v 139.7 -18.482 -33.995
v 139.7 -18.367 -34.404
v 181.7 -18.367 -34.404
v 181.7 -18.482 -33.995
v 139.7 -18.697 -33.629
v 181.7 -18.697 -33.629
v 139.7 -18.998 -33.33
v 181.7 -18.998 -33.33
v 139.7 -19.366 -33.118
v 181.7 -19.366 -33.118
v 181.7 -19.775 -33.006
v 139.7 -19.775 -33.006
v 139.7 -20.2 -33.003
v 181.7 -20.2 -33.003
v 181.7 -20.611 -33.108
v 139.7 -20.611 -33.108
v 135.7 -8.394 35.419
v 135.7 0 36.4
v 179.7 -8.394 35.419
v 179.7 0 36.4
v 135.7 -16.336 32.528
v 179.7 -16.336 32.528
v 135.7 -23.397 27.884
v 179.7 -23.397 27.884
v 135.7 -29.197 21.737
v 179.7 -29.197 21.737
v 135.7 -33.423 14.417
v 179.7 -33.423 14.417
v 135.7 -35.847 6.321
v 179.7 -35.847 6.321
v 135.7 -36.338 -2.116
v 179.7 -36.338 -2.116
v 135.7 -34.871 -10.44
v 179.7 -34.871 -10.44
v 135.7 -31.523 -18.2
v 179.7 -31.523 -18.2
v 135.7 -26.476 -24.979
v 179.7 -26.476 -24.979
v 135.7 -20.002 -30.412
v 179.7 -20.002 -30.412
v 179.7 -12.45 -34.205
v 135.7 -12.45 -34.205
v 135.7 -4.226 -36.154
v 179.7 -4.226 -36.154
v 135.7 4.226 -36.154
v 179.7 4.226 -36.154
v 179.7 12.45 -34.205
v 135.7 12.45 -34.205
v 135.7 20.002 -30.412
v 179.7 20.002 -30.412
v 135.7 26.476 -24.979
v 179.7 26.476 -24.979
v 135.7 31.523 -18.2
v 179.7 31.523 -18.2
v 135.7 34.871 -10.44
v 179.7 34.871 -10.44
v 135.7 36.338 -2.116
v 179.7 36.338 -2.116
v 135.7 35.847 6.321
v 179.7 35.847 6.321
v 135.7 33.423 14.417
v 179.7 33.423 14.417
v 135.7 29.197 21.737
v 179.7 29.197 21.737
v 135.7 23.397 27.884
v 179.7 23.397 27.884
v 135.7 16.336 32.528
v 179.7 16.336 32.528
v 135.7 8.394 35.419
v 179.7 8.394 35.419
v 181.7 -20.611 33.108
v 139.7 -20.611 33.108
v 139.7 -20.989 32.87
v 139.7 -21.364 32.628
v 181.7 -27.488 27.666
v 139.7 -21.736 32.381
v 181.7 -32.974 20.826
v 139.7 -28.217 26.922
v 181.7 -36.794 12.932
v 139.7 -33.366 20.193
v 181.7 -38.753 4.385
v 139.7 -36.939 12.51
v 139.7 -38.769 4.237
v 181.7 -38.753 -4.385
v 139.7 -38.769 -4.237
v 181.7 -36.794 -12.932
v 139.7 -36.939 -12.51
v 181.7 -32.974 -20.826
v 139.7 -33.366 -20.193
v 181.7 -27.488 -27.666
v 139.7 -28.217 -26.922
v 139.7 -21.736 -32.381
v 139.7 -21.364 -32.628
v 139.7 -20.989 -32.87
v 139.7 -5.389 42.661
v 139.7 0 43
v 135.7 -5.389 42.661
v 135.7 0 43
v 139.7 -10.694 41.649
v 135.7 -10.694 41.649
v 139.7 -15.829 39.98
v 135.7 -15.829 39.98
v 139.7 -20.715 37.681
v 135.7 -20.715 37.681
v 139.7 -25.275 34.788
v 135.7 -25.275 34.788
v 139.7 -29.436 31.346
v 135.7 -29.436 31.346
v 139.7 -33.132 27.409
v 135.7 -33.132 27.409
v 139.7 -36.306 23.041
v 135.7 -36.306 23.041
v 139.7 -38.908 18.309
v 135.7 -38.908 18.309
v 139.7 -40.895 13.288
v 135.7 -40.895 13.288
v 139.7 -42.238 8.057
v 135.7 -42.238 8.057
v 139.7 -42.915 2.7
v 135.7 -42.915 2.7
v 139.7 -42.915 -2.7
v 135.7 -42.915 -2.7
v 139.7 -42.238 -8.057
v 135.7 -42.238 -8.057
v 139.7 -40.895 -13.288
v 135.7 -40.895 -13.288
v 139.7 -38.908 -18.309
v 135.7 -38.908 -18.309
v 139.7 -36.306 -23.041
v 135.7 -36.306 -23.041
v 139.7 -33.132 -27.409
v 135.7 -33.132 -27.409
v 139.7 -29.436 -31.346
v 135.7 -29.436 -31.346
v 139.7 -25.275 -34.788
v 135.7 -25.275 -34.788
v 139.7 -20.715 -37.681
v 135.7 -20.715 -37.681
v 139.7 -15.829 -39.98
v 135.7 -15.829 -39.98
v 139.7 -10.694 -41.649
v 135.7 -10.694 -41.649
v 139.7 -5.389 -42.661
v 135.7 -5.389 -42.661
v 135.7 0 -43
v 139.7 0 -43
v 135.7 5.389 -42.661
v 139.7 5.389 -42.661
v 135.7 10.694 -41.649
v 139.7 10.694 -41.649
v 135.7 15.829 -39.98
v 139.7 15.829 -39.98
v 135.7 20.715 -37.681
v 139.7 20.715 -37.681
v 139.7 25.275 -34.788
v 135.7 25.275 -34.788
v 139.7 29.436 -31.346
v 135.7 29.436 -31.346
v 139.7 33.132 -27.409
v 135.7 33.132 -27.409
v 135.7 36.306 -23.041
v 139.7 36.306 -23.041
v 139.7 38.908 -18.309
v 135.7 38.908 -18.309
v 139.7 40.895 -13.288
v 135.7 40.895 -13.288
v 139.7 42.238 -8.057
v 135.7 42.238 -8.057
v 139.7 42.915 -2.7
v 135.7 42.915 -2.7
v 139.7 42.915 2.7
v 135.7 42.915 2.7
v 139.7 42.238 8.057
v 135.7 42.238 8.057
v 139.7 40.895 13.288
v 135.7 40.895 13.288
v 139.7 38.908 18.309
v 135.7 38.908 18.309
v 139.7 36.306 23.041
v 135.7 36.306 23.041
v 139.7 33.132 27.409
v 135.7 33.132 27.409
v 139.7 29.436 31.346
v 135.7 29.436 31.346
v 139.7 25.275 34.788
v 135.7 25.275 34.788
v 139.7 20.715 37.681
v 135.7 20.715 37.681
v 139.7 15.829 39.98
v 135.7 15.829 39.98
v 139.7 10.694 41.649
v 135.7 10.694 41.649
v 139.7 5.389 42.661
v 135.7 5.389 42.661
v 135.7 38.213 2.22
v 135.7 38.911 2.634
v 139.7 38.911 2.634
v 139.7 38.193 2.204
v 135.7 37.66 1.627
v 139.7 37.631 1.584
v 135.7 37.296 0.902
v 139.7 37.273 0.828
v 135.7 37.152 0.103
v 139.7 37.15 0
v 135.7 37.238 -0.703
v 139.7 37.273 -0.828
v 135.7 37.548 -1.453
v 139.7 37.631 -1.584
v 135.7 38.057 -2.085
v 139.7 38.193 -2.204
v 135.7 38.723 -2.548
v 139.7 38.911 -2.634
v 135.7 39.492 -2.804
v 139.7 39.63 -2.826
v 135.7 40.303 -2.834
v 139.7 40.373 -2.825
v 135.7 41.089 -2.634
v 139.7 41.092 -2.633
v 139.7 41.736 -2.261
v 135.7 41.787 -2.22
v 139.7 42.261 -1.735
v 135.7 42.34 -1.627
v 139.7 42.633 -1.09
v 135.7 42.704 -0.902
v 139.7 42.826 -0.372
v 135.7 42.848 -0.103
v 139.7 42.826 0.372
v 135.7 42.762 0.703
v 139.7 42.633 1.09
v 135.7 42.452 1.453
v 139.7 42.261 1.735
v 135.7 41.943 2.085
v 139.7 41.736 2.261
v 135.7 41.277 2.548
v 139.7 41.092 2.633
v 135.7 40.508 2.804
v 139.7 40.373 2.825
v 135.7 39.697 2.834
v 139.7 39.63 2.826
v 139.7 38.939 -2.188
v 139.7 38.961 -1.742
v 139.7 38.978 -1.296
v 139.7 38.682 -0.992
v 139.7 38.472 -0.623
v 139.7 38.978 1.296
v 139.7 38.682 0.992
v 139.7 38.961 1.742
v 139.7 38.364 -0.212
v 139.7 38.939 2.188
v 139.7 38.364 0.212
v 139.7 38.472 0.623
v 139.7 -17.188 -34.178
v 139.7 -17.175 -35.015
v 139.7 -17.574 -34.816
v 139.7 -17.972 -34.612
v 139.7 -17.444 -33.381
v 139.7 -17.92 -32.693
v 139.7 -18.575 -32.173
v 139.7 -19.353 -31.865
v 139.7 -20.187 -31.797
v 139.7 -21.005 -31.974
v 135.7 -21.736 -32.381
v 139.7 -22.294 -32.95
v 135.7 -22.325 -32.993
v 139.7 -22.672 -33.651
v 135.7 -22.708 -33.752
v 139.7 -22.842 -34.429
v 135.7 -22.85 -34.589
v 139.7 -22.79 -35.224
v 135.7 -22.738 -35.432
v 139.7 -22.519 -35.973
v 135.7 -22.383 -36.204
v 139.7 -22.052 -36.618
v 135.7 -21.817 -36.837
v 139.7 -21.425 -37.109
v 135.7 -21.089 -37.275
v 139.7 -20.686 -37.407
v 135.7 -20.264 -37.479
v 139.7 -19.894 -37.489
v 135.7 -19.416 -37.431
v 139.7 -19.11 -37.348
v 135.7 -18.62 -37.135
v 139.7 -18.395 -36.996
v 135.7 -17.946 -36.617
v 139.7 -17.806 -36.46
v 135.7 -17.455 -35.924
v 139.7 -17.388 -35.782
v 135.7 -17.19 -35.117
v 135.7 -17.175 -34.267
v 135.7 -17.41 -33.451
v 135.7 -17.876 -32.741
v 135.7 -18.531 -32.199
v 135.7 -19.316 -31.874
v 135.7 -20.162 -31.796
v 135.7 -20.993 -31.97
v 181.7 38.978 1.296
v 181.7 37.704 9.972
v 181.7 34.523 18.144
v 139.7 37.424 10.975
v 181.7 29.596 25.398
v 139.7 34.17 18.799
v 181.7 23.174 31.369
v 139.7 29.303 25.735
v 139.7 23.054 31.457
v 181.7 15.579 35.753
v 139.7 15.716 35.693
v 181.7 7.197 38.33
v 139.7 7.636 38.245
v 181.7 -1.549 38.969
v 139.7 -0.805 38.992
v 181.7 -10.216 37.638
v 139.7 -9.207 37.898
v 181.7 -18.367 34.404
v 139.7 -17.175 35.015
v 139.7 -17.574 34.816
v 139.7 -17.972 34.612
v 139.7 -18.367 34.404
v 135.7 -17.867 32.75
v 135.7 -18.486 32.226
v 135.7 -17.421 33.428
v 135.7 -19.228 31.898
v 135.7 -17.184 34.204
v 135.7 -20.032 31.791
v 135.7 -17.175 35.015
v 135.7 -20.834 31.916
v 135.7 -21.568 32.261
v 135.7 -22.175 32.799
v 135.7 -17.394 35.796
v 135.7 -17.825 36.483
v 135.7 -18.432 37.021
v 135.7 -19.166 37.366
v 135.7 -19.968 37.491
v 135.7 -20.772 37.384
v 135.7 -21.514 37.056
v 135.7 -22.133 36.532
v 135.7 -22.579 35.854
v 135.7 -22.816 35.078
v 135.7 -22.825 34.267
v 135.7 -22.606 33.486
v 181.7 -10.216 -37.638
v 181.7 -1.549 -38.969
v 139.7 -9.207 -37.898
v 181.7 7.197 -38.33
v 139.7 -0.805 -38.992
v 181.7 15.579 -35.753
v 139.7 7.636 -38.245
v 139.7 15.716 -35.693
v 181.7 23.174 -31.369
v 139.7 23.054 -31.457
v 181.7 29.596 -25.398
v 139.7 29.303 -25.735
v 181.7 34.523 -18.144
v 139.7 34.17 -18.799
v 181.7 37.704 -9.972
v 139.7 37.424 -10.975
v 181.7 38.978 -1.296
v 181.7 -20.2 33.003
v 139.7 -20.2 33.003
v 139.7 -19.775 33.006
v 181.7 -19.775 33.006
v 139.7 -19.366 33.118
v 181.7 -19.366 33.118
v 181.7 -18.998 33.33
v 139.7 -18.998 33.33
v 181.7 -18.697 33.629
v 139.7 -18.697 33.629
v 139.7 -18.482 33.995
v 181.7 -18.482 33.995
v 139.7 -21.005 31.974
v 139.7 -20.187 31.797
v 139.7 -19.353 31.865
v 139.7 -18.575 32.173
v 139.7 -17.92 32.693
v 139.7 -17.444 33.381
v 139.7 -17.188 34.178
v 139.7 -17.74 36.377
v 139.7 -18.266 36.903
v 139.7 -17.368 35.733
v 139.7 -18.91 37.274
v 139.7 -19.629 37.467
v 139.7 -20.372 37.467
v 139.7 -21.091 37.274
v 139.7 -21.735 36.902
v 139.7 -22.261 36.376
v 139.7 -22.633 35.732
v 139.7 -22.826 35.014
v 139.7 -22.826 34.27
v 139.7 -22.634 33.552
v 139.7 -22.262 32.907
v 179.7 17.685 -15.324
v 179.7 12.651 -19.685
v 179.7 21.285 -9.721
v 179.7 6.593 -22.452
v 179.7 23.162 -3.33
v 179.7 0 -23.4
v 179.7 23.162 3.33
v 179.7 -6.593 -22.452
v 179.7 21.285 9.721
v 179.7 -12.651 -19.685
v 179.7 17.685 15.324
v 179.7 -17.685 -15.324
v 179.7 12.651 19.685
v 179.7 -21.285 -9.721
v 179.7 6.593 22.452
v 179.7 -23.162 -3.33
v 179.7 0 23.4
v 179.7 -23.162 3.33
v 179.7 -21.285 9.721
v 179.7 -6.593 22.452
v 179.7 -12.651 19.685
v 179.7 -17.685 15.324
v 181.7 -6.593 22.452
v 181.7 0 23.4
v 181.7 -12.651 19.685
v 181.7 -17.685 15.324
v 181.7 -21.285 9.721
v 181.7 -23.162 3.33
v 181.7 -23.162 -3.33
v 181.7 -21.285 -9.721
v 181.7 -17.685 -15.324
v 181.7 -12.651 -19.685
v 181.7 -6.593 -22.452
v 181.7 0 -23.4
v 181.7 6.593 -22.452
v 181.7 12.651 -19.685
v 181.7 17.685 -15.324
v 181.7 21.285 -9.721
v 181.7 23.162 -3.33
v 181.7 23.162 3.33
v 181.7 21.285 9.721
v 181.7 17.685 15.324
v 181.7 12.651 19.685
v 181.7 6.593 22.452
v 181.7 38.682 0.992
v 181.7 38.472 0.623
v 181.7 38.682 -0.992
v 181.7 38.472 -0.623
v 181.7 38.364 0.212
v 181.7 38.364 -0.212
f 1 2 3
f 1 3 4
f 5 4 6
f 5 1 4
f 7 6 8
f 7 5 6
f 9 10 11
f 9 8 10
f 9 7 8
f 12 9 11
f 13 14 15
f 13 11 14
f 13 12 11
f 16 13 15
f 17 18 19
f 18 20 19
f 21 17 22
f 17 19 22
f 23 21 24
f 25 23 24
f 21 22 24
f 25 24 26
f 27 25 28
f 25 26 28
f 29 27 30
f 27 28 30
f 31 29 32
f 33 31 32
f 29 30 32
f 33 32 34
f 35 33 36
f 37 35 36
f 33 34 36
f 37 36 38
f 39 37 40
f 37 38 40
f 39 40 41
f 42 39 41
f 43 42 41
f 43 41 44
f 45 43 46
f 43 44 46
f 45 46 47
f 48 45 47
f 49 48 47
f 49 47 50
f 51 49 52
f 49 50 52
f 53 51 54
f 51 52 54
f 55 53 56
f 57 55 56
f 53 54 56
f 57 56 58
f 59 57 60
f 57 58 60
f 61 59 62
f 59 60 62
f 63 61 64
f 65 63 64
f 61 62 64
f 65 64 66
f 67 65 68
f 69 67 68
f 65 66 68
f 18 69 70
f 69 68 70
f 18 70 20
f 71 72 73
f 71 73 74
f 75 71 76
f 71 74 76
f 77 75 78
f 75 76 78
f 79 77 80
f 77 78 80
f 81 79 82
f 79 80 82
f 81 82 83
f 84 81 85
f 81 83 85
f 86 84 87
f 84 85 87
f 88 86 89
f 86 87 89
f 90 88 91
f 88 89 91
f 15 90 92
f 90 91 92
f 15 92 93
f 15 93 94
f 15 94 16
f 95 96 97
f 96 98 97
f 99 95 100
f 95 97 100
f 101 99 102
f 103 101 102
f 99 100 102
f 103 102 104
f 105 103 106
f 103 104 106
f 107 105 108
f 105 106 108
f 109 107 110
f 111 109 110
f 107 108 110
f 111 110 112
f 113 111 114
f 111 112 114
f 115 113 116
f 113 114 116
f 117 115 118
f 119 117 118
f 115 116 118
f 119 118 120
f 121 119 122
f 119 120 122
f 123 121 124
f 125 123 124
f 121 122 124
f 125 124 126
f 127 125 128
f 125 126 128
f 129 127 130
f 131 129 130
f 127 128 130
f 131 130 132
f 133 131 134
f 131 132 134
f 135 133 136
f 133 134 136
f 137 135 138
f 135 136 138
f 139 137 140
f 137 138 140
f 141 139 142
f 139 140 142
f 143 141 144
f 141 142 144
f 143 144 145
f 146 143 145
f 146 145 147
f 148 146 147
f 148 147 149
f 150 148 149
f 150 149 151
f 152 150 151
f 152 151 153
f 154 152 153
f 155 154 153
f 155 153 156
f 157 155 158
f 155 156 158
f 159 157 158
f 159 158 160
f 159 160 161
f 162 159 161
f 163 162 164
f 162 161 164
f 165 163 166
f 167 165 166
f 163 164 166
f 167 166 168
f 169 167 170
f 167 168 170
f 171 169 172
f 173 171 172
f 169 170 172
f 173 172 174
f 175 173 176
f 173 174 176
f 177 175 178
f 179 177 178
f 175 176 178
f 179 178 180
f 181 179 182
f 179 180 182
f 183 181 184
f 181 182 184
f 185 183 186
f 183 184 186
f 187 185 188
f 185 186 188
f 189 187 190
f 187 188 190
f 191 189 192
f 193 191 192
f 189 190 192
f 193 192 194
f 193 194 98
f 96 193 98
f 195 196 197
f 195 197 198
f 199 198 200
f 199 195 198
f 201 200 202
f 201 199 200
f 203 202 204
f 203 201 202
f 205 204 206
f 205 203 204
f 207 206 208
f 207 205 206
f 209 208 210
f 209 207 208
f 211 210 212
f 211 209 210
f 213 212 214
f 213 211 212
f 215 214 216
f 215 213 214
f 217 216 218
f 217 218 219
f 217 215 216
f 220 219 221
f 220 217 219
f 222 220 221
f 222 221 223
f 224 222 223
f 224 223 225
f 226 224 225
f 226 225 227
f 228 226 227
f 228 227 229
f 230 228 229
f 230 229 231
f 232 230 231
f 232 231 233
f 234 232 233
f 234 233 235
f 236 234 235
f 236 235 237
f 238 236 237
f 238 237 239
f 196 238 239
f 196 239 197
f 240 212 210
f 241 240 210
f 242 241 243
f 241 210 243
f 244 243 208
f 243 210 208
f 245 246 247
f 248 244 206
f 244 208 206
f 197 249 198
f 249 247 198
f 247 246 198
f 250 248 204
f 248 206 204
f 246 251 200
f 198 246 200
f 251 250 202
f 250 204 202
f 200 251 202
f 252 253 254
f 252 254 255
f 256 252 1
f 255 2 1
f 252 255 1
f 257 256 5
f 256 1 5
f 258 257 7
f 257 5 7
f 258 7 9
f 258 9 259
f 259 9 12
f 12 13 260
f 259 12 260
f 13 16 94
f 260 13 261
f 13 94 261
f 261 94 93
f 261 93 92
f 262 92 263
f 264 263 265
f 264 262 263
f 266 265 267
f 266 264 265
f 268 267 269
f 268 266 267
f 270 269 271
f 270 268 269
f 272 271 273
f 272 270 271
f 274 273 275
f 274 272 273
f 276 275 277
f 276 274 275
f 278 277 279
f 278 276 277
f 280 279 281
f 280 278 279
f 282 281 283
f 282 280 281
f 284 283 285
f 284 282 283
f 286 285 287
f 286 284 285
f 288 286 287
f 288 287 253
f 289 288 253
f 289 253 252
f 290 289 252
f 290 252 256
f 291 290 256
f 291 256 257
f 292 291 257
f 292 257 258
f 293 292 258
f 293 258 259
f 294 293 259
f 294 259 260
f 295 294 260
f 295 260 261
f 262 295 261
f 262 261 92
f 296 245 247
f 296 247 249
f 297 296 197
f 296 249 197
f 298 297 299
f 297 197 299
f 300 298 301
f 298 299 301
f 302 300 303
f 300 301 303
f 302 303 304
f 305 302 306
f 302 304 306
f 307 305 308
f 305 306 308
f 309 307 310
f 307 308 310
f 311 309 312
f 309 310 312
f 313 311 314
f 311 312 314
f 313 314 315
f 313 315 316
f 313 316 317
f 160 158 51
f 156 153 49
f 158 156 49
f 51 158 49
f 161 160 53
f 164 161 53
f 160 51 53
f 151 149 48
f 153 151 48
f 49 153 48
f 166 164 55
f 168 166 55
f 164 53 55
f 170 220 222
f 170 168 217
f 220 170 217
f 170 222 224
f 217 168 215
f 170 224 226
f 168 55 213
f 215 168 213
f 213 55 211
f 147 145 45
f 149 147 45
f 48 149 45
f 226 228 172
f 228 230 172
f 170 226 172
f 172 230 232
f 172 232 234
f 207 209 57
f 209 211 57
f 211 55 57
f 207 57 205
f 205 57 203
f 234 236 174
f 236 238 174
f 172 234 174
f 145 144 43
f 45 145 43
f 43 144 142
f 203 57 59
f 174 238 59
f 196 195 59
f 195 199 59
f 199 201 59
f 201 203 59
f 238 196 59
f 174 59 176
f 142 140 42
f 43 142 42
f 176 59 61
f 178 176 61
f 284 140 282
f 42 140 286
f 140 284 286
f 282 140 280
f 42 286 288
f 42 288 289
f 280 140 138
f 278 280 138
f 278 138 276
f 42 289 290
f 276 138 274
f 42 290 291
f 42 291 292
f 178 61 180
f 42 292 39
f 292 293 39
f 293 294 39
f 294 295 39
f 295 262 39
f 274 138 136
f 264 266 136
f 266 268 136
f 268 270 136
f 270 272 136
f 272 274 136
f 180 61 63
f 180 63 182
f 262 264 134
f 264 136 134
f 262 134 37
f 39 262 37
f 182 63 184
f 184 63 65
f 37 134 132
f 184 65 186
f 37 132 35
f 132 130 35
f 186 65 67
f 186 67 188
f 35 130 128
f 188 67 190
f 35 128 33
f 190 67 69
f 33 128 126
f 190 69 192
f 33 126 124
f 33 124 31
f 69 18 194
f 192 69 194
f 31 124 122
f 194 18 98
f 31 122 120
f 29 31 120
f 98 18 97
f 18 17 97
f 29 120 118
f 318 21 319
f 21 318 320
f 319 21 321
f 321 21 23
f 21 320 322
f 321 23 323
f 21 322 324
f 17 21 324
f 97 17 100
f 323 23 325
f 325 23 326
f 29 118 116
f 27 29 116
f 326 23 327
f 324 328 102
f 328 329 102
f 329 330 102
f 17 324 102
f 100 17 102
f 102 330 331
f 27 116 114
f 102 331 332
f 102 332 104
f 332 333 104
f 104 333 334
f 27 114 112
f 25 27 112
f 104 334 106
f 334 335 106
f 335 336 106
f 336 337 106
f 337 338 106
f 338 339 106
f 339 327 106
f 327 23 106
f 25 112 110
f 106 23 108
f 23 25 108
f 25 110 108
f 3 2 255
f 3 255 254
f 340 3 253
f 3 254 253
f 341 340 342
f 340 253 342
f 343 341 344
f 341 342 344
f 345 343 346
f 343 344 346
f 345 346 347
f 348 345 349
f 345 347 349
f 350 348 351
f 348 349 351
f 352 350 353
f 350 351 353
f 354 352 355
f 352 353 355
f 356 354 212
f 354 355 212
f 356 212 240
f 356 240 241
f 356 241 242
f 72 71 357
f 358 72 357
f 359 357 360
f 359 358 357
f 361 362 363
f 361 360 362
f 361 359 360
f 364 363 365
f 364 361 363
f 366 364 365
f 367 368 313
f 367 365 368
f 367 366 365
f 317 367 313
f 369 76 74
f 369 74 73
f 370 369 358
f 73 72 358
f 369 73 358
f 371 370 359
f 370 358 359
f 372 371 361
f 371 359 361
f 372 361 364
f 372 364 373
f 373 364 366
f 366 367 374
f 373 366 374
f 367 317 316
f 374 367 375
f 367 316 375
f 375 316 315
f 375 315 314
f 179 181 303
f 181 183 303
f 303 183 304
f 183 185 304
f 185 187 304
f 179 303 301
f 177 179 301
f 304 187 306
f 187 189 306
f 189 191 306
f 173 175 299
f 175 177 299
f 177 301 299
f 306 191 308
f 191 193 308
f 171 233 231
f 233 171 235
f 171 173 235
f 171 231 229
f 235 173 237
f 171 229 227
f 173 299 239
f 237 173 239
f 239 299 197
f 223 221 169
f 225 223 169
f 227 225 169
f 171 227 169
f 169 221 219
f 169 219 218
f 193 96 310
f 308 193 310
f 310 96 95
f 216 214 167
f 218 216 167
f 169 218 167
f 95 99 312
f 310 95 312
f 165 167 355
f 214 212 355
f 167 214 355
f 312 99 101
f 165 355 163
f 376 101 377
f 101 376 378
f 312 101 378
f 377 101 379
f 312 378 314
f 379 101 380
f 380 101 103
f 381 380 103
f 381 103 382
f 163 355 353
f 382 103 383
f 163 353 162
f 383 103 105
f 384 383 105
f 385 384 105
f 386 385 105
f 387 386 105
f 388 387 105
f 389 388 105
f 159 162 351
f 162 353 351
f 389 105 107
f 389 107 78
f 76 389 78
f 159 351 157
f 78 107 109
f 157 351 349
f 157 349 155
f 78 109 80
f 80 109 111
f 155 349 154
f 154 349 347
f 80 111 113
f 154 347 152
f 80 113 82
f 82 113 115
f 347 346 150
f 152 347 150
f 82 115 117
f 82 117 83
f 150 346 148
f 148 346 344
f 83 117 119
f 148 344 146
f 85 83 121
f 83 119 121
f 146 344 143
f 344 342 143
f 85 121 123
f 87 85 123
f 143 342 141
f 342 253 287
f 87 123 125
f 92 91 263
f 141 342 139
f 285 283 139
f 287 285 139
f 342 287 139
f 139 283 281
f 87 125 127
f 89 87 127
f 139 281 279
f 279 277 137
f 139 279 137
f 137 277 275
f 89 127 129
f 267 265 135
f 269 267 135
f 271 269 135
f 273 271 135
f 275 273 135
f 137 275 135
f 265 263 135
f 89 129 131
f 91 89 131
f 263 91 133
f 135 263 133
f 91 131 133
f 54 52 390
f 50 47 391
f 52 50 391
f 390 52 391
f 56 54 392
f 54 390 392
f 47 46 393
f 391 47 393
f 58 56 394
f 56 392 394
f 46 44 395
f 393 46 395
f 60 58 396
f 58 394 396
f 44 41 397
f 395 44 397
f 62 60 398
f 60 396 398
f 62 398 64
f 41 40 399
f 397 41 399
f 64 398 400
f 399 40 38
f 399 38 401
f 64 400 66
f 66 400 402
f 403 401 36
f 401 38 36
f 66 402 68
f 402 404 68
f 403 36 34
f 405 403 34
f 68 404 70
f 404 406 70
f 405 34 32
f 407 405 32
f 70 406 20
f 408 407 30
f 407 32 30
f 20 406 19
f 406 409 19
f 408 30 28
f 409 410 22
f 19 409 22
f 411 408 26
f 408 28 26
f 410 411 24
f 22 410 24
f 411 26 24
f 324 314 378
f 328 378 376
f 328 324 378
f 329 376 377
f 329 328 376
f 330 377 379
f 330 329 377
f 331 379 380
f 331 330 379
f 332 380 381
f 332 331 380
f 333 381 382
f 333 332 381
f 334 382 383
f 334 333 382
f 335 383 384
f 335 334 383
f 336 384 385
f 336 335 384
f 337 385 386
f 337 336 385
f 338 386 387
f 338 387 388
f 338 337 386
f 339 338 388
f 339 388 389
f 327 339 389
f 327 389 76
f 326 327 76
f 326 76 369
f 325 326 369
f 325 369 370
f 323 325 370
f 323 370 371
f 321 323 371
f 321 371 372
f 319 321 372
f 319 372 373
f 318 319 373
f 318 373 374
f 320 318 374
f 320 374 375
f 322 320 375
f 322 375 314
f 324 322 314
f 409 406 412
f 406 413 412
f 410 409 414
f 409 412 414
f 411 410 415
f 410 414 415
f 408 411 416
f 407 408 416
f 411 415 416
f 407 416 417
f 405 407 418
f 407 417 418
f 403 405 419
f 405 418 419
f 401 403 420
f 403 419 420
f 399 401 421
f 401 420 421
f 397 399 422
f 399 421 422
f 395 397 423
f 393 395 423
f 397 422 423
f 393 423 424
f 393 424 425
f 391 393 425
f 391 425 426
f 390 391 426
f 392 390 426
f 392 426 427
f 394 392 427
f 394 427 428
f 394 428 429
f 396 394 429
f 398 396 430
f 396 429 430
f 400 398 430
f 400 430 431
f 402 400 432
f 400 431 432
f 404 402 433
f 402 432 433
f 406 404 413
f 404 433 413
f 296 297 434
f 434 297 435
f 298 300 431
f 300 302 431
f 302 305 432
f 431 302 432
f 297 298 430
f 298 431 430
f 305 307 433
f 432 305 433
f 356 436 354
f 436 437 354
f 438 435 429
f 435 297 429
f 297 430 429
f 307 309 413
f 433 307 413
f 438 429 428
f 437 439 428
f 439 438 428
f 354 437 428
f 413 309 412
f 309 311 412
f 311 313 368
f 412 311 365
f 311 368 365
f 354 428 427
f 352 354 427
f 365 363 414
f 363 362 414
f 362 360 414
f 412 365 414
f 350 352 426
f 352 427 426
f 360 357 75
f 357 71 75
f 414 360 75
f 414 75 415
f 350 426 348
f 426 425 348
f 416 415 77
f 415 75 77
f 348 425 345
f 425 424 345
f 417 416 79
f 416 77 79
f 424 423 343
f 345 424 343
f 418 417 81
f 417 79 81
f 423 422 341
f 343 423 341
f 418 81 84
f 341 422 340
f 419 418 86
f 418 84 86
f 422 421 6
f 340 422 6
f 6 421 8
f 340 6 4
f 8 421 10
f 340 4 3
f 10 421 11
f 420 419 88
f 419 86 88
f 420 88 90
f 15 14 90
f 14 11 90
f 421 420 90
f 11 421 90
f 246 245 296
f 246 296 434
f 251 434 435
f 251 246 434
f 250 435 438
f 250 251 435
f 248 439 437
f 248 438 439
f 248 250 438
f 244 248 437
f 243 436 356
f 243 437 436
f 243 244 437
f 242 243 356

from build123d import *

# Parameters (mm, degrees)
AXIAL_HOLES_DEPTH      = 192.606080279
AXIAL_HOLES_DEPTH_BACK = 192.606080279
SKETCH2_R              = 1.65
CUT_EXTRUDE2_START     = 135.7
SKETCH3_R              = 2.85
CUT_EXTRUDE2_DEPTH     = 4


with BuildPart() as part:
    # Axial profile (mm) → Full revolution (revolve)
    with BuildSketch(Plane.XY, mode=Mode.PRIVATE) as full_revolution_sk:
        Polygon((135.7, 36.4), (179.7, 36.4), (179.7, 23.4), (181.7, 23.4), (181.7, 39), (139.7, 39), (139.7, 43), (135.7, 43), align=None)
    revolve(full_revolution_sk.sketch.rotate(Axis((-110, 0, 0), (1, 0, 0)), 90), axis=Axis((-110, 0, 0), (1, 0, 0)))

    # Sketch2 → Axial holes (cut, two sides: drawn at the far end of the back side and taken through both)
    with BuildSketch(Plane(origin=(0, 0, 0), x_dir=(0, 0, -1), z_dir=(1, 0, 0)).offset(-AXIAL_HOLES_DEPTH_BACK)):
        with Locations(Location((0, 40, 0), (0, 0, 218.251159994))):
            Circle(SKETCH2_R)
        with Locations(Location((-34.641016151, -20, 0), (0, 0, 81.748840006))):
            Circle(SKETCH2_R)
        with Locations(Location((34.641016151, -20, 0), (0, 0, 201.748840006))):
            Circle(SKETCH2_R)
    extrude(amount=AXIAL_HOLES_DEPTH + AXIAL_HOLES_DEPTH_BACK, mode=Mode.SUBTRACT)

    # Sketch3 → Cut-Extrude2 (cut)
    with BuildSketch(Plane(origin=(0, 0, 0), x_dir=(0, 0, -1), z_dir=(1, 0, 0)).offset(CUT_EXTRUDE2_START)):
        with Locations(Location((0, 40, 0), (0, 0, 202.464828441))):
            Circle(SKETCH3_R)
        with Locations(Location((-34.641016151, -20, 0), (0, 0, 97.535171559))):
            Circle(SKETCH3_R)
        with Locations(Location((34.641016151, -20, 0), (0, 0, 217.535171559))):
            Circle(SKETCH3_R)
    extrude(amount=CUT_EXTRUDE2_DEPTH, mode=Mode.SUBTRACT)


solid = part.part
